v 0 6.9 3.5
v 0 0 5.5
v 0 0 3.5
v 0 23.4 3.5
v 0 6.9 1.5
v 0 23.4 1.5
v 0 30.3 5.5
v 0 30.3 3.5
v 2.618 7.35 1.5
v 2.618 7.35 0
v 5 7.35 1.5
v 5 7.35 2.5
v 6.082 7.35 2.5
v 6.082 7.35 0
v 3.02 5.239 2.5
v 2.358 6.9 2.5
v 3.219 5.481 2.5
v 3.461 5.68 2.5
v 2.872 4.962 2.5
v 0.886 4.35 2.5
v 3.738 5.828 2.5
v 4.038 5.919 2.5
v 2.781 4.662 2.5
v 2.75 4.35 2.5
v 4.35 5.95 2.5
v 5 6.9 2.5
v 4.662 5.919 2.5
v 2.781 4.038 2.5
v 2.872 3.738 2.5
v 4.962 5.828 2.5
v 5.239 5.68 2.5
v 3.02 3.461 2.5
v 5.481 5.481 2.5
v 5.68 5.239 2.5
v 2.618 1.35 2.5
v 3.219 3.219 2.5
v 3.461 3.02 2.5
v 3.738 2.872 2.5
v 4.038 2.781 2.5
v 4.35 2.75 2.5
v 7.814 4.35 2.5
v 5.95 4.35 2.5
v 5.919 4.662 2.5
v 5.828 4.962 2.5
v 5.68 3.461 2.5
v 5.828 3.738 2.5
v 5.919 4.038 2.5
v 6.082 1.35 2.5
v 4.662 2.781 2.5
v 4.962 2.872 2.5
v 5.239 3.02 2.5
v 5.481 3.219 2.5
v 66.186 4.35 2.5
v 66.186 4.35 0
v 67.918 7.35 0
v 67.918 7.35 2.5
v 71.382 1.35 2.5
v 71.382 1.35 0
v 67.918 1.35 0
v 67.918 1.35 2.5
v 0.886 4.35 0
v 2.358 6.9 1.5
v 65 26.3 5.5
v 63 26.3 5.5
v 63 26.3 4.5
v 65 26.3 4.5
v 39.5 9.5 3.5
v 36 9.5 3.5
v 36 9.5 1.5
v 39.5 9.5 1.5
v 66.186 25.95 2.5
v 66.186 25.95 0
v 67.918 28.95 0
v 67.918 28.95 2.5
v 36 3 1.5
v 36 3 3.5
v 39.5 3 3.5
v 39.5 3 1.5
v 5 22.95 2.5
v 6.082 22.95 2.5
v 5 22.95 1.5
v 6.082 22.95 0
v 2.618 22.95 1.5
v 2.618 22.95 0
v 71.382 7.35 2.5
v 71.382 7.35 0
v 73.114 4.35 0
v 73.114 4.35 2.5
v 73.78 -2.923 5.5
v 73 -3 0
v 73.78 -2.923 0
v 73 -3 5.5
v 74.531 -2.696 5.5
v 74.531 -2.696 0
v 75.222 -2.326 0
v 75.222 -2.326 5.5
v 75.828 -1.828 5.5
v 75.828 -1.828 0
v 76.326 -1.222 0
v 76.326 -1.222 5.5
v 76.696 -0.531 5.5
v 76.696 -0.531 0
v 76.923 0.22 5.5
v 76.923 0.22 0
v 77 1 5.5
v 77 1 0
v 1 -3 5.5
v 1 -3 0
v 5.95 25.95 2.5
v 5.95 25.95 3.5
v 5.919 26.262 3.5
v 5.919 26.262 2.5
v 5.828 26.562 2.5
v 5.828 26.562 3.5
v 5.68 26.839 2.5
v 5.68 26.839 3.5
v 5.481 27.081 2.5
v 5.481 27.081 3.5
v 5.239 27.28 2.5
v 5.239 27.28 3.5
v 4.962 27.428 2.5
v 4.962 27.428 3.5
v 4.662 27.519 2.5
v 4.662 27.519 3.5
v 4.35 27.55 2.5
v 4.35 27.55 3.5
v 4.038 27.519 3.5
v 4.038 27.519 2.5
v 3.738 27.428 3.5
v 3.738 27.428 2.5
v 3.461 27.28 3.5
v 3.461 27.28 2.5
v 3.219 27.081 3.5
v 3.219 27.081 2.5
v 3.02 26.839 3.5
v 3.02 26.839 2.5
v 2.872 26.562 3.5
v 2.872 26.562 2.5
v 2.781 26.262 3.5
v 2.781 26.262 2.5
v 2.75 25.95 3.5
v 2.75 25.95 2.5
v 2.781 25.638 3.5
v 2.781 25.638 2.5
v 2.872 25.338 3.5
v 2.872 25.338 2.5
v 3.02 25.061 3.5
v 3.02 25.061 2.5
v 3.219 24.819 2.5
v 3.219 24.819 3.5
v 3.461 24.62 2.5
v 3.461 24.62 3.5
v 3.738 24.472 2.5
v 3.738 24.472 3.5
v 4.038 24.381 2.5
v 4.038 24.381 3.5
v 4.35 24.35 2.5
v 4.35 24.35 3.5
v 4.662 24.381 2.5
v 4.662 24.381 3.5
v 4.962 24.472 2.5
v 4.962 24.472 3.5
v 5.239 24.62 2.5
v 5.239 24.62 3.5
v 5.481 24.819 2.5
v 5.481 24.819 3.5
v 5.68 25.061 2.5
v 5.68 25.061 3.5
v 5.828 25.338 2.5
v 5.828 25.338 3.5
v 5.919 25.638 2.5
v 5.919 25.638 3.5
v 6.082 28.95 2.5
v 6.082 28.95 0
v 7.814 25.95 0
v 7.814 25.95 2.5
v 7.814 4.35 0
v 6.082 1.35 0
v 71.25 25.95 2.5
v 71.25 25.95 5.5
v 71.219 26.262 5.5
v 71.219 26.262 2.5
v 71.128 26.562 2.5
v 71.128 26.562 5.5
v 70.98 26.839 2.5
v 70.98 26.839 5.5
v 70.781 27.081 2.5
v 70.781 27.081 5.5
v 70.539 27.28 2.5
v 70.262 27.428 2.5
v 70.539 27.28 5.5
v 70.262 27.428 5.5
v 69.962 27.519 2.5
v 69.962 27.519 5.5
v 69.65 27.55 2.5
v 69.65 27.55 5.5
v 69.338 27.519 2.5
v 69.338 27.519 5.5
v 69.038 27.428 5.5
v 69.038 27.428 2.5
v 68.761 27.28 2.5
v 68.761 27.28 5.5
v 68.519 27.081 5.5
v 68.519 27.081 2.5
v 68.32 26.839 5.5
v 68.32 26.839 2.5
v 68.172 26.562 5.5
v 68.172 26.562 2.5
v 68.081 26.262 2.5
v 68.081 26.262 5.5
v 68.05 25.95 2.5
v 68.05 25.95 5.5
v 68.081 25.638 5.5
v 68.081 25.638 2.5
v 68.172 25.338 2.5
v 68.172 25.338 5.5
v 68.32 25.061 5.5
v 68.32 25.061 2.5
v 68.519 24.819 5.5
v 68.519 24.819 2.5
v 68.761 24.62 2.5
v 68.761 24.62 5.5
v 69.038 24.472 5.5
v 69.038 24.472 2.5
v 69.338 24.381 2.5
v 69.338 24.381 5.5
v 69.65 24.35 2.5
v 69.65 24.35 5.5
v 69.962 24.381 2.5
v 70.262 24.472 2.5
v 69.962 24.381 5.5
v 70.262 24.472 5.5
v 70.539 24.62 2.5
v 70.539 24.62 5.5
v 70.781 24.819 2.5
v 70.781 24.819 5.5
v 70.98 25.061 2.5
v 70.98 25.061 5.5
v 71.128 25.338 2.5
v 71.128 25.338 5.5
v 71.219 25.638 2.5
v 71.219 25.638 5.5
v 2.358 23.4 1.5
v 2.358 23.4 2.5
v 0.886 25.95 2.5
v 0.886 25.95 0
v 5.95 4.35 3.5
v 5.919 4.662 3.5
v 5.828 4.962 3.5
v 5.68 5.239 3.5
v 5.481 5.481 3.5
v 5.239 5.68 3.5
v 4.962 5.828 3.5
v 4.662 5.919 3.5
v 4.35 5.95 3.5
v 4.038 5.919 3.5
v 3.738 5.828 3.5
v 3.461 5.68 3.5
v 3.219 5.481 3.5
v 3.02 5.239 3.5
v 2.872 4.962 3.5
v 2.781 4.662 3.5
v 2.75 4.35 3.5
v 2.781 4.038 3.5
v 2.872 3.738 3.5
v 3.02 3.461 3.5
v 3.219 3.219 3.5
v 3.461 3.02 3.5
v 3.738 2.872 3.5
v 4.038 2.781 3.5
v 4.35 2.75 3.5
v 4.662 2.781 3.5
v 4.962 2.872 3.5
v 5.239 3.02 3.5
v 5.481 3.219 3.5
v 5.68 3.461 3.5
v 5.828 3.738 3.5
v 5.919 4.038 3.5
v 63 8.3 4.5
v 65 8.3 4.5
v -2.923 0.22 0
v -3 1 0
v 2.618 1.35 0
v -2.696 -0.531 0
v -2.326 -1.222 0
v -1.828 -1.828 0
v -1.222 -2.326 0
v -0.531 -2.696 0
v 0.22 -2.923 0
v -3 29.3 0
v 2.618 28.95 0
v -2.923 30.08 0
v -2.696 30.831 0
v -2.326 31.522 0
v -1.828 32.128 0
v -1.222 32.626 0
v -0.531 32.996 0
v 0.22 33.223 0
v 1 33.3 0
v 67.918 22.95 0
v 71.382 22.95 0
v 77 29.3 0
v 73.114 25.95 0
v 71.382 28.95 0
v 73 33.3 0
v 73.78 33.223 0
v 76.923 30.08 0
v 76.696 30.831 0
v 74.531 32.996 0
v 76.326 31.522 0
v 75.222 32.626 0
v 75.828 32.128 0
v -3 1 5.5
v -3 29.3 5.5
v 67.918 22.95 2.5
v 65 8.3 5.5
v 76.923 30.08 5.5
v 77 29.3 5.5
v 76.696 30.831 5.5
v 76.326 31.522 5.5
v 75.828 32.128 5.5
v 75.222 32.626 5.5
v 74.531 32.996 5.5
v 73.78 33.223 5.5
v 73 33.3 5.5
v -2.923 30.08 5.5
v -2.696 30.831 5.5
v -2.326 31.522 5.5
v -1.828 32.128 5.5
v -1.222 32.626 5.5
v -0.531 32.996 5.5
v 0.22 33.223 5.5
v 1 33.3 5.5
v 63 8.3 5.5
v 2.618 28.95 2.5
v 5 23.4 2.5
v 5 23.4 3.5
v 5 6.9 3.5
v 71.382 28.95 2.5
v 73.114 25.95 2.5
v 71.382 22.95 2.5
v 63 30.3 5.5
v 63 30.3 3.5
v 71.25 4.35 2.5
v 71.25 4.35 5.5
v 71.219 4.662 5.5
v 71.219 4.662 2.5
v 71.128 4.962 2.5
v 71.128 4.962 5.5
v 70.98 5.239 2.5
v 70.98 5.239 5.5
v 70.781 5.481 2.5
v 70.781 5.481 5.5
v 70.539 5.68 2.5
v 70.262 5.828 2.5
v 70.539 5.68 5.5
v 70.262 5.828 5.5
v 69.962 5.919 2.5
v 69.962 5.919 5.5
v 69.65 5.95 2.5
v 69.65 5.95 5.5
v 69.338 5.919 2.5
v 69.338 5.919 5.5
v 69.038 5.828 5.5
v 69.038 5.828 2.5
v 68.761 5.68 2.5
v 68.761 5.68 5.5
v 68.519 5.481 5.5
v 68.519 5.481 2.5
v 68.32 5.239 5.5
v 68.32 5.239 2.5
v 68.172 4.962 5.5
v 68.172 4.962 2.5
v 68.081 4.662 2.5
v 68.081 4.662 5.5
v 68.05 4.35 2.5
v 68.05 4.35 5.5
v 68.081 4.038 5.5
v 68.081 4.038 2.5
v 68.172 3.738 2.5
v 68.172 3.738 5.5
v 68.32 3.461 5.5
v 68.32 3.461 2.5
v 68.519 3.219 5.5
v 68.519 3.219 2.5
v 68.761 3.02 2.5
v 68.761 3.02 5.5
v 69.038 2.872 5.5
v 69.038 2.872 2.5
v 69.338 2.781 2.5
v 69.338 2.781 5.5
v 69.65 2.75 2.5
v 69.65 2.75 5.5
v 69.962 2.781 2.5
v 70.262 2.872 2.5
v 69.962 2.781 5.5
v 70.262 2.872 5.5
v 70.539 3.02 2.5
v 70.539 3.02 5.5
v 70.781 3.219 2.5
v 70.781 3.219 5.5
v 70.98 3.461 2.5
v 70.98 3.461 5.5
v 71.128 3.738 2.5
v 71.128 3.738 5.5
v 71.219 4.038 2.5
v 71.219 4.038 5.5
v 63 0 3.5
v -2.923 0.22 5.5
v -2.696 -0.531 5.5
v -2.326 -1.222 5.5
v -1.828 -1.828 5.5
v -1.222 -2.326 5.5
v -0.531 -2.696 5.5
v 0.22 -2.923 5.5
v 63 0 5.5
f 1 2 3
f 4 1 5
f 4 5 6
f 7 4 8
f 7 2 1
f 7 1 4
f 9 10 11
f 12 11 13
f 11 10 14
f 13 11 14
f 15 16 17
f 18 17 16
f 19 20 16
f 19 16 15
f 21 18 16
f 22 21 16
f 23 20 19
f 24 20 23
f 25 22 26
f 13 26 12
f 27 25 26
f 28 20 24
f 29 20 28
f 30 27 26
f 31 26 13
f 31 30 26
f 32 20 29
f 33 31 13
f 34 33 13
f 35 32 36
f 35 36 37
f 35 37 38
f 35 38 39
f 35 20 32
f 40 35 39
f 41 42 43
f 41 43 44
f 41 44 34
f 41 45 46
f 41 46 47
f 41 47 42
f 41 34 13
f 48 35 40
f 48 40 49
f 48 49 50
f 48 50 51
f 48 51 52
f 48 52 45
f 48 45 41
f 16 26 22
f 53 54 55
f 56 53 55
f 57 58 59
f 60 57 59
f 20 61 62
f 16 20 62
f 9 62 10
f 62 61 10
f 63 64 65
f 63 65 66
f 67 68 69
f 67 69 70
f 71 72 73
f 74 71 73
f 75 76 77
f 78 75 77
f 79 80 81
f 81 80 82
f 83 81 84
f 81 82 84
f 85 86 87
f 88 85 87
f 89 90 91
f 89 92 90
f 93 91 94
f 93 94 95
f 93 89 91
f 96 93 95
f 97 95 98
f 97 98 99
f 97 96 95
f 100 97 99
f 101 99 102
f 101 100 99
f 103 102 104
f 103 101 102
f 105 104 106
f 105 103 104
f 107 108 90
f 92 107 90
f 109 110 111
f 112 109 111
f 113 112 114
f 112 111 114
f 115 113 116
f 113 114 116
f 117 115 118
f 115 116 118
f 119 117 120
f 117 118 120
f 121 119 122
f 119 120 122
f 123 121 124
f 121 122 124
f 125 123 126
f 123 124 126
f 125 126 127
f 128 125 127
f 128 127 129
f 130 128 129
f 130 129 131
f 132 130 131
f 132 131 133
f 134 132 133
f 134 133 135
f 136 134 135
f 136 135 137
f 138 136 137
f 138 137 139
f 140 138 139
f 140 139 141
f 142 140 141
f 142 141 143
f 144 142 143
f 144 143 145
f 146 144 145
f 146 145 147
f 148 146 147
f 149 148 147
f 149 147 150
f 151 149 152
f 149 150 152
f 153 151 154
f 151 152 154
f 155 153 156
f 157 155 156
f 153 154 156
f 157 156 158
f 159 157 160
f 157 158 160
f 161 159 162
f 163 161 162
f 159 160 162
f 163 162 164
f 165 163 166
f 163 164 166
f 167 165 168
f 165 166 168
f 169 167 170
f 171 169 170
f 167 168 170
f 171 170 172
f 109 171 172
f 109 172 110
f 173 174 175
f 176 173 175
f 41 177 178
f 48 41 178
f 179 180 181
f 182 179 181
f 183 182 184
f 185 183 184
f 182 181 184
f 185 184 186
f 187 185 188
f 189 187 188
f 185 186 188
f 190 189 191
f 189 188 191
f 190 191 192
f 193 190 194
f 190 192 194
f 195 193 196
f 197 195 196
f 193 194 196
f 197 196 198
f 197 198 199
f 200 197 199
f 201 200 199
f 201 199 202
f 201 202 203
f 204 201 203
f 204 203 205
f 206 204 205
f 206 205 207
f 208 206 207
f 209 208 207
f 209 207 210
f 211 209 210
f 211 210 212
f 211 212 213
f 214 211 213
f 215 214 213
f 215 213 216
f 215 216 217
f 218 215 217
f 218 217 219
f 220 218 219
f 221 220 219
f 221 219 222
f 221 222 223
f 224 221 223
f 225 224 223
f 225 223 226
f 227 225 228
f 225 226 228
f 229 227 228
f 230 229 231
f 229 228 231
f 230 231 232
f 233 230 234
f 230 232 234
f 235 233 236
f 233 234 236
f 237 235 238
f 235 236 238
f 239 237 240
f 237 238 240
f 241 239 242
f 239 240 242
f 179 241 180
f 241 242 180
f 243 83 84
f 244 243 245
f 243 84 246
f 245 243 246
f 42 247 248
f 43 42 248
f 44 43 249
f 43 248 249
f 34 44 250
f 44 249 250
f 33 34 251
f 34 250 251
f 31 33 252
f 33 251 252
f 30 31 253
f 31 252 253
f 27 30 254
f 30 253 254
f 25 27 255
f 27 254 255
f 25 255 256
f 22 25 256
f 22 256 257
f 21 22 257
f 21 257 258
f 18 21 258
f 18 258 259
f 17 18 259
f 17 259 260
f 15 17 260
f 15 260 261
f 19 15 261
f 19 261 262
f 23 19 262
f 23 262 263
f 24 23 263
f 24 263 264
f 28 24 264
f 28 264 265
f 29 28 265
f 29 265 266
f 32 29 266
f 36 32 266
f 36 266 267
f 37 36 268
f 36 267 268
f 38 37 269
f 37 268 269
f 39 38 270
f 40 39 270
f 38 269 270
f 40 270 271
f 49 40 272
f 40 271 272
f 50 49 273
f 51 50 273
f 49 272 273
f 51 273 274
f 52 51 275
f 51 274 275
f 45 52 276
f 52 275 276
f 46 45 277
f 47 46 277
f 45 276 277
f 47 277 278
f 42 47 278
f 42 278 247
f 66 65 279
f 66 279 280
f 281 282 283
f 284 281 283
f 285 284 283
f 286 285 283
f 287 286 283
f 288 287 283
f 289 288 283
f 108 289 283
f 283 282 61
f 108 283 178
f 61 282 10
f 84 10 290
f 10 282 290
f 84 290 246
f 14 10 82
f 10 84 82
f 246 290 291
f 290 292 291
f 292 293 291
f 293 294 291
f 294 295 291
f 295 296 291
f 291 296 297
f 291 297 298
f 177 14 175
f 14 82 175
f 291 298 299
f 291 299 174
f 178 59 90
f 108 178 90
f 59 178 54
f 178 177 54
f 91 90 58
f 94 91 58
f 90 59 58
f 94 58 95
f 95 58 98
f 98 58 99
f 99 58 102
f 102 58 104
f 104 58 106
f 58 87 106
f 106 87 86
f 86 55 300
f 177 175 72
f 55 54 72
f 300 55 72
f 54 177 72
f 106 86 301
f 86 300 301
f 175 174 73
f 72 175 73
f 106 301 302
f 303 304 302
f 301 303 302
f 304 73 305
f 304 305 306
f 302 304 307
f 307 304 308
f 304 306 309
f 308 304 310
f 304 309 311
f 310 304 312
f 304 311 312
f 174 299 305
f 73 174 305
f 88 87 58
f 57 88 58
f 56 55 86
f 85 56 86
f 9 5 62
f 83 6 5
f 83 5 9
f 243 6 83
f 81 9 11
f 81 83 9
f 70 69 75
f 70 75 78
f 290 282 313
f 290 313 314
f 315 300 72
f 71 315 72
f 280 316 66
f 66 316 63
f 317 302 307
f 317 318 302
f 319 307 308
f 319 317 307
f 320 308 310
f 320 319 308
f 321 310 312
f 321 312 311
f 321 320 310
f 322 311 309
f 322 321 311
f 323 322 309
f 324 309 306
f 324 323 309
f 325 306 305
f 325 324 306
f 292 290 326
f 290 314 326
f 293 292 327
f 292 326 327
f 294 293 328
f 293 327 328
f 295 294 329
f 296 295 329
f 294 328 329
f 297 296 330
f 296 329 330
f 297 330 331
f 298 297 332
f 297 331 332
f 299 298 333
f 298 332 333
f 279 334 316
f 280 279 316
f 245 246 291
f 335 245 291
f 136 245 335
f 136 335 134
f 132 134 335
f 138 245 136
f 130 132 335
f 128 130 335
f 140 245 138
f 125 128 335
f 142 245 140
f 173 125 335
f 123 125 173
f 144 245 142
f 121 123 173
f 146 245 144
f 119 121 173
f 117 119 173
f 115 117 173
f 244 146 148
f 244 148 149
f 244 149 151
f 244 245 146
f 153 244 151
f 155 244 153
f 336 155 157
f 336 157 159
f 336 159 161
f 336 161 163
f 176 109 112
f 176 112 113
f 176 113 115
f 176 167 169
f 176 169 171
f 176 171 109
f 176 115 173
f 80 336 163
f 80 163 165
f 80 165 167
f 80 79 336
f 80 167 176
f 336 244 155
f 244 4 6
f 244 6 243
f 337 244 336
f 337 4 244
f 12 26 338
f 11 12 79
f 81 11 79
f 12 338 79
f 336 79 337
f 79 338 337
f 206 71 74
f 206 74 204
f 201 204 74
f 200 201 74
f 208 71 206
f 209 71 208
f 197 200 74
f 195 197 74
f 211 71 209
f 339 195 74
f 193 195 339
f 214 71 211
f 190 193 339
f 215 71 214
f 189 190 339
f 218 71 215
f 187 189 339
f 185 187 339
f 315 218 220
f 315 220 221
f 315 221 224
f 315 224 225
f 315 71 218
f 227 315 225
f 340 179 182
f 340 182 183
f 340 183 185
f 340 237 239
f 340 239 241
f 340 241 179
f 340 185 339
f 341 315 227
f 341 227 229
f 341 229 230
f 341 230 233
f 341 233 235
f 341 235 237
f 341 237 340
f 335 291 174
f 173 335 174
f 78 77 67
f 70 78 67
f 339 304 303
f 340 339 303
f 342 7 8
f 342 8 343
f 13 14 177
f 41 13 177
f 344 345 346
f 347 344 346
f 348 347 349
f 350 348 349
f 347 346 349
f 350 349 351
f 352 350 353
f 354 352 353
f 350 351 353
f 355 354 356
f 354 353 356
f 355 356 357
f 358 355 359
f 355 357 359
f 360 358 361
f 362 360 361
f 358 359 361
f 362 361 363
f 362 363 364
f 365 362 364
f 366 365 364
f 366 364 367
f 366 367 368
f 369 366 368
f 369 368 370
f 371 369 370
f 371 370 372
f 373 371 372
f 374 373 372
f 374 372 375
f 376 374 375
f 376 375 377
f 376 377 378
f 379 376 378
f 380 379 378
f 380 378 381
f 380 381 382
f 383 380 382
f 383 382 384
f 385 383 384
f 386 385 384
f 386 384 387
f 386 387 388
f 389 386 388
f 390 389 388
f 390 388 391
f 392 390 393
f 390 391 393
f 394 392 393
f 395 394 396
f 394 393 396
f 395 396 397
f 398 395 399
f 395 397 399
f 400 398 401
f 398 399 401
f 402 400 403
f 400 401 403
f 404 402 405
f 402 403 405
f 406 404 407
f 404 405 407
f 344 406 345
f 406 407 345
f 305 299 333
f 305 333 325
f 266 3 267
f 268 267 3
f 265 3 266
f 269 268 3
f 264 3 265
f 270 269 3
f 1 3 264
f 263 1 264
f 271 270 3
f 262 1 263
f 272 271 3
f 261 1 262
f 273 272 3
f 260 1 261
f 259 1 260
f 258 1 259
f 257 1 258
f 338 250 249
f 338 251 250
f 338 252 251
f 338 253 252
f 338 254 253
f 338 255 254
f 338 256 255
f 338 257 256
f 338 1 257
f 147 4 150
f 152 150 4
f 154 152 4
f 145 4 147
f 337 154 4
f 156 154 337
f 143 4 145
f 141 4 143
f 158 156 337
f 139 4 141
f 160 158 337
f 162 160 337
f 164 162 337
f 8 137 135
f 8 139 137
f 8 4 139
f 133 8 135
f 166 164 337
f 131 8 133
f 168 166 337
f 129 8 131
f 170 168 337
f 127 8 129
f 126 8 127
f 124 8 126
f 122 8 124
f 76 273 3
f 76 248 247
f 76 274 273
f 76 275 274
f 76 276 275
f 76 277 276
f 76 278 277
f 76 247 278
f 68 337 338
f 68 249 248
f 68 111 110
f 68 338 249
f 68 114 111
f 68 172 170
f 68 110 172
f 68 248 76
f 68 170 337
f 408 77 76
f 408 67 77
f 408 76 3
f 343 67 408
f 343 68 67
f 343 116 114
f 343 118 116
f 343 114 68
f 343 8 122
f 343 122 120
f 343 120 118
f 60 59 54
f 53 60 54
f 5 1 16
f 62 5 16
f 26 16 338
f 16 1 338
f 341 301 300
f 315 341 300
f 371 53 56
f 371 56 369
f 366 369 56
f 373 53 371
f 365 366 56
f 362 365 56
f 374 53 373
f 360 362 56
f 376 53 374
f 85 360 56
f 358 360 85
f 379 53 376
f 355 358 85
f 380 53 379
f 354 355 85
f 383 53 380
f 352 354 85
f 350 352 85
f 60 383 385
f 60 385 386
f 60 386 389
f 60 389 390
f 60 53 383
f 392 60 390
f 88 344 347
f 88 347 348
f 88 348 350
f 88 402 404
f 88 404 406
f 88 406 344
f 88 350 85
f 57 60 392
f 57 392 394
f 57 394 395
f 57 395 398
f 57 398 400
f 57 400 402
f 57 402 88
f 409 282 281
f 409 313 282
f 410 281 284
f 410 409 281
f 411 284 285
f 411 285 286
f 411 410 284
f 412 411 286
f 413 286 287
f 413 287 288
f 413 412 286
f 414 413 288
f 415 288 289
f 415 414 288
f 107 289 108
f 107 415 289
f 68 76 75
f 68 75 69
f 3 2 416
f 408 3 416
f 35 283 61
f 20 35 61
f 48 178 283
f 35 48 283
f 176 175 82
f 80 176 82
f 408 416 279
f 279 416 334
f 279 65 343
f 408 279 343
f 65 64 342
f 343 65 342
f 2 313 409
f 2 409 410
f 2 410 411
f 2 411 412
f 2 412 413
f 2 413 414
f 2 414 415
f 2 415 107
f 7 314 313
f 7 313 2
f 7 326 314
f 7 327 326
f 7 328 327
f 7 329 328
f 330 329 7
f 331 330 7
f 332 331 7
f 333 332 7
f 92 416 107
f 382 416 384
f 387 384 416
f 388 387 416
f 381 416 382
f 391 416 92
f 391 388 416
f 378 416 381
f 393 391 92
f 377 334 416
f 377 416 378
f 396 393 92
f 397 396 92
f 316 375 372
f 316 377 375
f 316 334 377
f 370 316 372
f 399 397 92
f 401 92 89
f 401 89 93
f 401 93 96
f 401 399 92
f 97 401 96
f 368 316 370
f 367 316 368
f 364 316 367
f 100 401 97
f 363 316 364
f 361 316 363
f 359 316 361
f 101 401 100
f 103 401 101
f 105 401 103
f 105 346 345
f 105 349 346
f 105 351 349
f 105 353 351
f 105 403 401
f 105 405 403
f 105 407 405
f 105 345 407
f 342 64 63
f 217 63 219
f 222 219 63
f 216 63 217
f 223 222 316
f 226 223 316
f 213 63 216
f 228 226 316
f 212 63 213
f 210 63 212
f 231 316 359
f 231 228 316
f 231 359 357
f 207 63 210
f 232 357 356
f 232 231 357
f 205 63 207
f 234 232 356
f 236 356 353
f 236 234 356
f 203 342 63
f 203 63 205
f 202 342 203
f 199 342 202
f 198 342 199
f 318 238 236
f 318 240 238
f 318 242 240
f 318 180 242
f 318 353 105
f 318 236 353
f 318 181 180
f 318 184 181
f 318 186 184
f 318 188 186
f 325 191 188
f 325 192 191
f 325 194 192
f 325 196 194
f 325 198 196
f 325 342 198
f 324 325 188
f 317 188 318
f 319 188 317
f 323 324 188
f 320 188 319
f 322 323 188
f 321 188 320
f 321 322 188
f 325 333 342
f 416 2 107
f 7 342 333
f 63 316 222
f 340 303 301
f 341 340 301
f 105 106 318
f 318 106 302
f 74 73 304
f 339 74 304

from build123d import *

# Parameters (mm, degrees)
F0_W      = 80
F0_H      = 36.3
F1_DEPTH  = 5.5
F2_R      = 4
F3_W      = 63
F3_H      = 30.3
F4_DEPTH  = 2
F5_W      = 5
F5_H      = 16.5
F5_W_2    = 3.5
F5_H_2    = 6.5
F6_DEPTH  = 4
F7_W      = 2
F7_H      = 18
F8_DEPTH  = 1
F9_R      = 1.6
F10_DEPTH = 5.501
F12_DEPTH = 2.5


with BuildPart() as f1:
    # F0 (on Top) → F1 (new body)
    with BuildSketch(Plane.XY):
        with Locations((37, 15.15)):
            Rectangle(F0_W, F0_H)
    extrude(amount=F1_DEPTH)

    # F2
    f2_edges = [f1.edges().sort_by_distance(p)[0] for p in [
        (-3, -3, 2.75),
        (77, -3, 2.75),
        (77, 33.3, 2.75),
        (-3, 33.3, 2.75),
    ]]
    fillet(f2_edges, radius=F2_R)

    # F3 (on face) → F4 (cut)
    with BuildSketch(Plane.XY.offset(5.5)):
        with Locations((31.5, 15.15)):
            Rectangle(F3_W, F3_H)
    extrude(amount=-F4_DEPTH, mode=Mode.SUBTRACT)

    # F5 (on face) → F6 (cut)
    with BuildSketch(Plane.XY.offset(5.5)):
        with Locations((2.5, 15.15)):
            Rectangle(F5_W, F5_H)
        with Locations((37.75, 6.25)):
            Rectangle(F5_W_2, F5_H_2)
    extrude(amount=-F6_DEPTH, mode=Mode.SUBTRACT)

    # F7 (on face) → F8 (cut)
    with BuildSketch(Plane.XY.offset(5.5)):
        with Locations((64, 17.3)):
            Rectangle(F7_W, F7_H)
    extrude(amount=-F8_DEPTH, mode=Mode.SUBTRACT)

    # F9 (on face) → F10 (cut, through all)
    with BuildSketch(Plane.XY.offset(5.5)):
        with Locations((4.35, 4.35)):
            Circle(F9_R)
        with Locations((4.35, 25.95)):
            Circle(F9_R)
        with Locations((69.65, 25.95)):
            Circle(F9_R)
        with Locations((69.65, 4.35)):
            Circle(F9_R)
    extrude(amount=-F10_DEPTH, mode=Mode.SUBTRACT)

    # F11 (on face) → F12 (cut)
    with BuildSketch(Plane(origin=(0, 0, 0), x_dir=(1, 0, 0), z_dir=(0, 0, -1))):
        Polygon((67.917949, -28.95), (71.382051, -28.95), (73.114102, -25.95), (71.382051, -22.95), (67.917949, -22.95), (66.185898, -25.95), align=None)
        Polygon((73.114102, -4.35), (71.382051, -1.35), (67.917949, -1.35), (66.185898, -4.35), (67.917949, -7.35), (71.382051, -7.35), align=None)
        Polygon((7.814102, -25.95), (6.082051, -22.95), (2.617949, -22.95), (0.885898, -25.95), (2.617949, -28.95), (6.082051, -28.95), align=None)
        Polygon((7.814102, -4.35), (6.082051, -1.35), (2.617949, -1.35), (0.885898, -4.35), (2.617949, -7.35), (6.082051, -7.35), align=None)
    extrude(amount=-F12_DEPTH, mode=Mode.SUBTRACT)


solid = f1.part
